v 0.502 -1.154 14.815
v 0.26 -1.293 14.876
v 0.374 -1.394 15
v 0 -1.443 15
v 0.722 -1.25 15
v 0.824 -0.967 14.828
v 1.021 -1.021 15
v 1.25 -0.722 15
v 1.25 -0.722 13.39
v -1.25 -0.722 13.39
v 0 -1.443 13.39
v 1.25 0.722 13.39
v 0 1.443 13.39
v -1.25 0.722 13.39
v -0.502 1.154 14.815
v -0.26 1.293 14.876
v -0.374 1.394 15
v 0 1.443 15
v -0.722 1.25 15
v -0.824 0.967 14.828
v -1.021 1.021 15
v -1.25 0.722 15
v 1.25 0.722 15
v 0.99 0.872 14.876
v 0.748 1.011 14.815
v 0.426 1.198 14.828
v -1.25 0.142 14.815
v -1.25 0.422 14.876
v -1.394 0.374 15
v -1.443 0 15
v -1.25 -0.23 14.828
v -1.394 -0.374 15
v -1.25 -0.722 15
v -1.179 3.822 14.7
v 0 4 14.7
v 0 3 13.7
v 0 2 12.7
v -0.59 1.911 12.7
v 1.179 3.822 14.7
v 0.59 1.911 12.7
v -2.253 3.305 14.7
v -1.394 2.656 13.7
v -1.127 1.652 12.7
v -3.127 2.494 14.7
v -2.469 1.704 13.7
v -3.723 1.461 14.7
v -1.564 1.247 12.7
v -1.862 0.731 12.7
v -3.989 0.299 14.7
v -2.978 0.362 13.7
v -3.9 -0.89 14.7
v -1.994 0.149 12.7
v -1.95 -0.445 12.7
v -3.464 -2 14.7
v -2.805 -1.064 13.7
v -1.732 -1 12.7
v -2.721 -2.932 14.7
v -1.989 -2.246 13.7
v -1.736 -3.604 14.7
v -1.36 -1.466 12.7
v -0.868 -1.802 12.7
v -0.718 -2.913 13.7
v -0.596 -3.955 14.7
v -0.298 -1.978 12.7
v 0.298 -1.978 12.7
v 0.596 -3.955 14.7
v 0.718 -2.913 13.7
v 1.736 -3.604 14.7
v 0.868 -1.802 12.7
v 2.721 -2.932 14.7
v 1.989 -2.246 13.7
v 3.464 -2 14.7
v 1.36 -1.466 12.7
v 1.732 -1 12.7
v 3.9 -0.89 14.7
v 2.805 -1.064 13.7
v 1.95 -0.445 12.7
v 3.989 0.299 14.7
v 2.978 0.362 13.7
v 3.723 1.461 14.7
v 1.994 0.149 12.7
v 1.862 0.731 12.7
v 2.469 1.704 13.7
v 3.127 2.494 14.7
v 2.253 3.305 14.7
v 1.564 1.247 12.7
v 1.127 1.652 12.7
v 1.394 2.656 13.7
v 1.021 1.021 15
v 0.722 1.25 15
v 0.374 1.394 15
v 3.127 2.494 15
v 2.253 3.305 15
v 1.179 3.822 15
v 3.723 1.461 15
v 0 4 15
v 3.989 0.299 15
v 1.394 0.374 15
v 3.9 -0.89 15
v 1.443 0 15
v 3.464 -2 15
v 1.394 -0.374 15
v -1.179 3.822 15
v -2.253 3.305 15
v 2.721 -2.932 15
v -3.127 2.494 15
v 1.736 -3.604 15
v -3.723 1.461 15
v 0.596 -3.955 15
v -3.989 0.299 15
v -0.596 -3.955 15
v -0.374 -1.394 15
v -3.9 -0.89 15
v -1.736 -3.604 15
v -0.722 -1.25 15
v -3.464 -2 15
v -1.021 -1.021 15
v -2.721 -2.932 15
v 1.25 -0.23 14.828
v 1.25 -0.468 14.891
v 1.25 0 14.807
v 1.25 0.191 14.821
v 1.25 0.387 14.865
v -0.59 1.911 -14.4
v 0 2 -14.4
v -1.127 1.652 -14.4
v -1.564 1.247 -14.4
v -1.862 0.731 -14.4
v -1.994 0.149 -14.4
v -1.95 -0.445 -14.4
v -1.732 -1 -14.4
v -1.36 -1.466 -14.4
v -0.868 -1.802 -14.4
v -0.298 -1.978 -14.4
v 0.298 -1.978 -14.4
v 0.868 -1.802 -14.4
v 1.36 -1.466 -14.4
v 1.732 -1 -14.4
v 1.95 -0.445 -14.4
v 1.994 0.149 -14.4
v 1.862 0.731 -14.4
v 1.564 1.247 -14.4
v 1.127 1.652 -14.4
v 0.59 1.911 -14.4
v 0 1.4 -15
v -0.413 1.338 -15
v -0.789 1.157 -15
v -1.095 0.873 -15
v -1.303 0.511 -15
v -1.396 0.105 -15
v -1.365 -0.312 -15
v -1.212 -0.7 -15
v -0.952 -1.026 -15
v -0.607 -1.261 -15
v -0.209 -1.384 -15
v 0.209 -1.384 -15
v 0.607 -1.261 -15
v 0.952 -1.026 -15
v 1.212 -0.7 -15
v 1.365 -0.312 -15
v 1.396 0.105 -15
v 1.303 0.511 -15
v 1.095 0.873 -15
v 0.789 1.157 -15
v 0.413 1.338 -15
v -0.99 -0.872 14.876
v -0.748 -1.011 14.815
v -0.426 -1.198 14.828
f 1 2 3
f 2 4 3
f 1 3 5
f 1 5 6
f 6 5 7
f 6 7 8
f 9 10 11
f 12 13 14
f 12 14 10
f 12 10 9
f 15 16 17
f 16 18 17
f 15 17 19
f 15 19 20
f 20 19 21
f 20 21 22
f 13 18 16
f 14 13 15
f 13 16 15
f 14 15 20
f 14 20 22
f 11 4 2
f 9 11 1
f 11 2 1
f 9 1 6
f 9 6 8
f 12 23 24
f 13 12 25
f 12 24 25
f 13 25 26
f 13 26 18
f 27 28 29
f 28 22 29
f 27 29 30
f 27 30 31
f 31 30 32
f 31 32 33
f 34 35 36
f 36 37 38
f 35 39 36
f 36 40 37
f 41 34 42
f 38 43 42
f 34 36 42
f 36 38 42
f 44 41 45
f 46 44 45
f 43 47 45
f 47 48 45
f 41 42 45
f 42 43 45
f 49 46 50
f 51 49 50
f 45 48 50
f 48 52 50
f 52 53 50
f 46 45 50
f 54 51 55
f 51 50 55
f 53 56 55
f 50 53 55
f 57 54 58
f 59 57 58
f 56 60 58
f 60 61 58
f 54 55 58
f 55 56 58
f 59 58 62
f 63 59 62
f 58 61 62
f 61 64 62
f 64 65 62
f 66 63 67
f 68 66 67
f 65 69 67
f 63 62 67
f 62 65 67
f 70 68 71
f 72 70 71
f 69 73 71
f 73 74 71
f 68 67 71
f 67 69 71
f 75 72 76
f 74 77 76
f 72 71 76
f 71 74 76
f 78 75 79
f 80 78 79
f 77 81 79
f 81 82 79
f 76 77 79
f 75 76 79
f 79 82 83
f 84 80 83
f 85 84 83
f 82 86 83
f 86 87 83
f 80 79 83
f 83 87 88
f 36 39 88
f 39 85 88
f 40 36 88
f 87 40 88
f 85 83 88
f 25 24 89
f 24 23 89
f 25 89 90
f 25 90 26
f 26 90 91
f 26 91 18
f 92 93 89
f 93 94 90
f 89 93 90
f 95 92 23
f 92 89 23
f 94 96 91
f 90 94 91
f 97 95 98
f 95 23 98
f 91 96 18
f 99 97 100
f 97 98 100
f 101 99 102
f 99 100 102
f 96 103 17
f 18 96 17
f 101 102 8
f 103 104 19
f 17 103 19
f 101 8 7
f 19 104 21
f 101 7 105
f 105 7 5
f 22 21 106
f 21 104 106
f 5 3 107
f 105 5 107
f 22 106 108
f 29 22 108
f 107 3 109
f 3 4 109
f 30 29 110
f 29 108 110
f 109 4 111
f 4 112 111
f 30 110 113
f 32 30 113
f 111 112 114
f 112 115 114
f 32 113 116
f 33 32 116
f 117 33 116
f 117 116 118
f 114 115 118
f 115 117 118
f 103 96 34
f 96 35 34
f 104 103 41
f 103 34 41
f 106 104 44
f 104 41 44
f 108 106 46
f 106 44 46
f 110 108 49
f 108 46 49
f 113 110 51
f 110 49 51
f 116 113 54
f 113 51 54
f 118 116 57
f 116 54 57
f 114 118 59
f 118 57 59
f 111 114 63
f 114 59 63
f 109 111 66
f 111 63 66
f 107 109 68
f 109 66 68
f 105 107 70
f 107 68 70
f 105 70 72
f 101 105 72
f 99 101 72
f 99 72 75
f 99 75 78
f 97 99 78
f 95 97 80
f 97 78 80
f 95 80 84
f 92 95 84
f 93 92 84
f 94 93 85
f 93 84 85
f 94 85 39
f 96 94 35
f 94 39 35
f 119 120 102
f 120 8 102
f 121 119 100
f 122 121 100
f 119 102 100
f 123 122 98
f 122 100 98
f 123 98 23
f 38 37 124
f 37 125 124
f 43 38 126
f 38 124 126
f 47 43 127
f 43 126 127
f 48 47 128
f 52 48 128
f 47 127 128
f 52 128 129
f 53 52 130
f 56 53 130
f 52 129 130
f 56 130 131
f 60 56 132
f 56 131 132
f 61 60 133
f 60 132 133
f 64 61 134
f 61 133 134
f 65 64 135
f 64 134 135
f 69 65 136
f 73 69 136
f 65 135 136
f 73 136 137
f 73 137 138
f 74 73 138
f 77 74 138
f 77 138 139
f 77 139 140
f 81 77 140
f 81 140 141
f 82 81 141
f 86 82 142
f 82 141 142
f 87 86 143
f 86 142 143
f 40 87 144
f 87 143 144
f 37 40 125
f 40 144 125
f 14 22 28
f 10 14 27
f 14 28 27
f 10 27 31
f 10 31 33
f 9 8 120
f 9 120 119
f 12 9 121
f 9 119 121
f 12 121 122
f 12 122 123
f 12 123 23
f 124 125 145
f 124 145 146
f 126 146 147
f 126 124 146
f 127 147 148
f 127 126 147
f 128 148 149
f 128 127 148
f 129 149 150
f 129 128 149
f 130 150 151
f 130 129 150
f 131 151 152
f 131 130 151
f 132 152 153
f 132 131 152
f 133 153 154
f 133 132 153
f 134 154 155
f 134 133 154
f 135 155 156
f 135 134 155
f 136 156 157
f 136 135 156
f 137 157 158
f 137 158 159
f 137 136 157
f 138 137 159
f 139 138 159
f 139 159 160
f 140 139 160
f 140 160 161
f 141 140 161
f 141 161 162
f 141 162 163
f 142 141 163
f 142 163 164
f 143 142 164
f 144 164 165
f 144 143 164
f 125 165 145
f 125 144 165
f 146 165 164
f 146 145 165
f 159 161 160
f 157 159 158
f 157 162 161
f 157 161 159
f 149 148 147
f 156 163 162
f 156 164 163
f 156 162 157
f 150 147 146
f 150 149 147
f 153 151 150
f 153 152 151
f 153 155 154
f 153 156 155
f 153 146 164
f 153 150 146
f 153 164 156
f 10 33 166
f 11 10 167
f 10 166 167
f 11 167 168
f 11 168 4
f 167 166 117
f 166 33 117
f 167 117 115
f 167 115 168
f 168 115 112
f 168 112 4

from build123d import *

# Parameters (mm, degrees)
SKETCH3_W          = 30
SKETCH3_H          = 2
CHAMFER1_SIZE      = 0.6
CUT_EXTRUDE1_DEPTH = 1.61
SKETCH9_R          = 1.443375673
CUT_EXTRUDE2_DEPTH = 1.61
CUT_EXTRUDE2_DRAFT = -45


with BuildPart() as part:
    # Sketch3 → Revolve1 (revolve)
    with BuildSketch(Plane(origin=(0, 0, 0), x_dir=(0, 0, -1), z_dir=(1, 0, 0))):
        with Locations((0, 1)):
            Rectangle(SKETCH3_W, SKETCH3_H)
    revolve(axis=Axis((0, 0, -15), (0, 0, 1)))

    # Chamfer1
    chamfer1_edges = [part.edges().sort_by_distance(p)[0] for p in [
        (0, -2, -15),
    ]]
    chamfer(chamfer1_edges, length=CHAMFER1_SIZE)

    # Sketch6 → Revolve2 (revolve)
    with BuildSketch(Plane(origin=(0, 0, 0), x_dir=(0, 0, -1), z_dir=(1, 0, 0))):
        Polygon((-15, 4), (-14.7, 4), (-12.7, 2), (-12.7, 0), (-15, 0), align=None)
    revolve(axis=Axis((0, 0, -15), (0, 0, 1)))

    # Sketch8 → Cut-Extrude1 (cut)
    with BuildSketch(Plane.XY.offset(15)):
        Polygon((0, 1.443375673), (-1.25, 0.721687836), (-1.25, -0.721687836), (0, -1.443375673), (1.25, -0.721687836), (1.25, 0.721687836), align=None)
    extrude(amount=-CUT_EXTRUDE1_DEPTH, mode=Mode.SUBTRACT)


with BuildPart() as cut_extrude2_tool:
    # Sketch9 → Cut-Extrude2 (with draft: the straight prism first)
    with BuildSketch(Plane.XY.offset(15)):
        Circle(SKETCH9_R)
    extrude(amount=-CUT_EXTRUDE2_DEPTH)
    # Cut-Extrude2: the draft: its side faces are tilted about the plane it starts from
    cut_extrude2_sides = [cut_extrude2_tool.faces().sort_by_distance(p)[0] for p in [
        (-1.443375673, 0, 14.195),
    ]]
    draft(cut_extrude2_sides, Plane.XY.offset(15), CUT_EXTRUDE2_DRAFT)


with BuildPart() as part_1:
    add(part.part)

    # Cut-Extrude2: cut by cut_extrude2_tool
    add(cut_extrude2_tool.part, mode=Mode.SUBTRACT)


solid = part_1.part
